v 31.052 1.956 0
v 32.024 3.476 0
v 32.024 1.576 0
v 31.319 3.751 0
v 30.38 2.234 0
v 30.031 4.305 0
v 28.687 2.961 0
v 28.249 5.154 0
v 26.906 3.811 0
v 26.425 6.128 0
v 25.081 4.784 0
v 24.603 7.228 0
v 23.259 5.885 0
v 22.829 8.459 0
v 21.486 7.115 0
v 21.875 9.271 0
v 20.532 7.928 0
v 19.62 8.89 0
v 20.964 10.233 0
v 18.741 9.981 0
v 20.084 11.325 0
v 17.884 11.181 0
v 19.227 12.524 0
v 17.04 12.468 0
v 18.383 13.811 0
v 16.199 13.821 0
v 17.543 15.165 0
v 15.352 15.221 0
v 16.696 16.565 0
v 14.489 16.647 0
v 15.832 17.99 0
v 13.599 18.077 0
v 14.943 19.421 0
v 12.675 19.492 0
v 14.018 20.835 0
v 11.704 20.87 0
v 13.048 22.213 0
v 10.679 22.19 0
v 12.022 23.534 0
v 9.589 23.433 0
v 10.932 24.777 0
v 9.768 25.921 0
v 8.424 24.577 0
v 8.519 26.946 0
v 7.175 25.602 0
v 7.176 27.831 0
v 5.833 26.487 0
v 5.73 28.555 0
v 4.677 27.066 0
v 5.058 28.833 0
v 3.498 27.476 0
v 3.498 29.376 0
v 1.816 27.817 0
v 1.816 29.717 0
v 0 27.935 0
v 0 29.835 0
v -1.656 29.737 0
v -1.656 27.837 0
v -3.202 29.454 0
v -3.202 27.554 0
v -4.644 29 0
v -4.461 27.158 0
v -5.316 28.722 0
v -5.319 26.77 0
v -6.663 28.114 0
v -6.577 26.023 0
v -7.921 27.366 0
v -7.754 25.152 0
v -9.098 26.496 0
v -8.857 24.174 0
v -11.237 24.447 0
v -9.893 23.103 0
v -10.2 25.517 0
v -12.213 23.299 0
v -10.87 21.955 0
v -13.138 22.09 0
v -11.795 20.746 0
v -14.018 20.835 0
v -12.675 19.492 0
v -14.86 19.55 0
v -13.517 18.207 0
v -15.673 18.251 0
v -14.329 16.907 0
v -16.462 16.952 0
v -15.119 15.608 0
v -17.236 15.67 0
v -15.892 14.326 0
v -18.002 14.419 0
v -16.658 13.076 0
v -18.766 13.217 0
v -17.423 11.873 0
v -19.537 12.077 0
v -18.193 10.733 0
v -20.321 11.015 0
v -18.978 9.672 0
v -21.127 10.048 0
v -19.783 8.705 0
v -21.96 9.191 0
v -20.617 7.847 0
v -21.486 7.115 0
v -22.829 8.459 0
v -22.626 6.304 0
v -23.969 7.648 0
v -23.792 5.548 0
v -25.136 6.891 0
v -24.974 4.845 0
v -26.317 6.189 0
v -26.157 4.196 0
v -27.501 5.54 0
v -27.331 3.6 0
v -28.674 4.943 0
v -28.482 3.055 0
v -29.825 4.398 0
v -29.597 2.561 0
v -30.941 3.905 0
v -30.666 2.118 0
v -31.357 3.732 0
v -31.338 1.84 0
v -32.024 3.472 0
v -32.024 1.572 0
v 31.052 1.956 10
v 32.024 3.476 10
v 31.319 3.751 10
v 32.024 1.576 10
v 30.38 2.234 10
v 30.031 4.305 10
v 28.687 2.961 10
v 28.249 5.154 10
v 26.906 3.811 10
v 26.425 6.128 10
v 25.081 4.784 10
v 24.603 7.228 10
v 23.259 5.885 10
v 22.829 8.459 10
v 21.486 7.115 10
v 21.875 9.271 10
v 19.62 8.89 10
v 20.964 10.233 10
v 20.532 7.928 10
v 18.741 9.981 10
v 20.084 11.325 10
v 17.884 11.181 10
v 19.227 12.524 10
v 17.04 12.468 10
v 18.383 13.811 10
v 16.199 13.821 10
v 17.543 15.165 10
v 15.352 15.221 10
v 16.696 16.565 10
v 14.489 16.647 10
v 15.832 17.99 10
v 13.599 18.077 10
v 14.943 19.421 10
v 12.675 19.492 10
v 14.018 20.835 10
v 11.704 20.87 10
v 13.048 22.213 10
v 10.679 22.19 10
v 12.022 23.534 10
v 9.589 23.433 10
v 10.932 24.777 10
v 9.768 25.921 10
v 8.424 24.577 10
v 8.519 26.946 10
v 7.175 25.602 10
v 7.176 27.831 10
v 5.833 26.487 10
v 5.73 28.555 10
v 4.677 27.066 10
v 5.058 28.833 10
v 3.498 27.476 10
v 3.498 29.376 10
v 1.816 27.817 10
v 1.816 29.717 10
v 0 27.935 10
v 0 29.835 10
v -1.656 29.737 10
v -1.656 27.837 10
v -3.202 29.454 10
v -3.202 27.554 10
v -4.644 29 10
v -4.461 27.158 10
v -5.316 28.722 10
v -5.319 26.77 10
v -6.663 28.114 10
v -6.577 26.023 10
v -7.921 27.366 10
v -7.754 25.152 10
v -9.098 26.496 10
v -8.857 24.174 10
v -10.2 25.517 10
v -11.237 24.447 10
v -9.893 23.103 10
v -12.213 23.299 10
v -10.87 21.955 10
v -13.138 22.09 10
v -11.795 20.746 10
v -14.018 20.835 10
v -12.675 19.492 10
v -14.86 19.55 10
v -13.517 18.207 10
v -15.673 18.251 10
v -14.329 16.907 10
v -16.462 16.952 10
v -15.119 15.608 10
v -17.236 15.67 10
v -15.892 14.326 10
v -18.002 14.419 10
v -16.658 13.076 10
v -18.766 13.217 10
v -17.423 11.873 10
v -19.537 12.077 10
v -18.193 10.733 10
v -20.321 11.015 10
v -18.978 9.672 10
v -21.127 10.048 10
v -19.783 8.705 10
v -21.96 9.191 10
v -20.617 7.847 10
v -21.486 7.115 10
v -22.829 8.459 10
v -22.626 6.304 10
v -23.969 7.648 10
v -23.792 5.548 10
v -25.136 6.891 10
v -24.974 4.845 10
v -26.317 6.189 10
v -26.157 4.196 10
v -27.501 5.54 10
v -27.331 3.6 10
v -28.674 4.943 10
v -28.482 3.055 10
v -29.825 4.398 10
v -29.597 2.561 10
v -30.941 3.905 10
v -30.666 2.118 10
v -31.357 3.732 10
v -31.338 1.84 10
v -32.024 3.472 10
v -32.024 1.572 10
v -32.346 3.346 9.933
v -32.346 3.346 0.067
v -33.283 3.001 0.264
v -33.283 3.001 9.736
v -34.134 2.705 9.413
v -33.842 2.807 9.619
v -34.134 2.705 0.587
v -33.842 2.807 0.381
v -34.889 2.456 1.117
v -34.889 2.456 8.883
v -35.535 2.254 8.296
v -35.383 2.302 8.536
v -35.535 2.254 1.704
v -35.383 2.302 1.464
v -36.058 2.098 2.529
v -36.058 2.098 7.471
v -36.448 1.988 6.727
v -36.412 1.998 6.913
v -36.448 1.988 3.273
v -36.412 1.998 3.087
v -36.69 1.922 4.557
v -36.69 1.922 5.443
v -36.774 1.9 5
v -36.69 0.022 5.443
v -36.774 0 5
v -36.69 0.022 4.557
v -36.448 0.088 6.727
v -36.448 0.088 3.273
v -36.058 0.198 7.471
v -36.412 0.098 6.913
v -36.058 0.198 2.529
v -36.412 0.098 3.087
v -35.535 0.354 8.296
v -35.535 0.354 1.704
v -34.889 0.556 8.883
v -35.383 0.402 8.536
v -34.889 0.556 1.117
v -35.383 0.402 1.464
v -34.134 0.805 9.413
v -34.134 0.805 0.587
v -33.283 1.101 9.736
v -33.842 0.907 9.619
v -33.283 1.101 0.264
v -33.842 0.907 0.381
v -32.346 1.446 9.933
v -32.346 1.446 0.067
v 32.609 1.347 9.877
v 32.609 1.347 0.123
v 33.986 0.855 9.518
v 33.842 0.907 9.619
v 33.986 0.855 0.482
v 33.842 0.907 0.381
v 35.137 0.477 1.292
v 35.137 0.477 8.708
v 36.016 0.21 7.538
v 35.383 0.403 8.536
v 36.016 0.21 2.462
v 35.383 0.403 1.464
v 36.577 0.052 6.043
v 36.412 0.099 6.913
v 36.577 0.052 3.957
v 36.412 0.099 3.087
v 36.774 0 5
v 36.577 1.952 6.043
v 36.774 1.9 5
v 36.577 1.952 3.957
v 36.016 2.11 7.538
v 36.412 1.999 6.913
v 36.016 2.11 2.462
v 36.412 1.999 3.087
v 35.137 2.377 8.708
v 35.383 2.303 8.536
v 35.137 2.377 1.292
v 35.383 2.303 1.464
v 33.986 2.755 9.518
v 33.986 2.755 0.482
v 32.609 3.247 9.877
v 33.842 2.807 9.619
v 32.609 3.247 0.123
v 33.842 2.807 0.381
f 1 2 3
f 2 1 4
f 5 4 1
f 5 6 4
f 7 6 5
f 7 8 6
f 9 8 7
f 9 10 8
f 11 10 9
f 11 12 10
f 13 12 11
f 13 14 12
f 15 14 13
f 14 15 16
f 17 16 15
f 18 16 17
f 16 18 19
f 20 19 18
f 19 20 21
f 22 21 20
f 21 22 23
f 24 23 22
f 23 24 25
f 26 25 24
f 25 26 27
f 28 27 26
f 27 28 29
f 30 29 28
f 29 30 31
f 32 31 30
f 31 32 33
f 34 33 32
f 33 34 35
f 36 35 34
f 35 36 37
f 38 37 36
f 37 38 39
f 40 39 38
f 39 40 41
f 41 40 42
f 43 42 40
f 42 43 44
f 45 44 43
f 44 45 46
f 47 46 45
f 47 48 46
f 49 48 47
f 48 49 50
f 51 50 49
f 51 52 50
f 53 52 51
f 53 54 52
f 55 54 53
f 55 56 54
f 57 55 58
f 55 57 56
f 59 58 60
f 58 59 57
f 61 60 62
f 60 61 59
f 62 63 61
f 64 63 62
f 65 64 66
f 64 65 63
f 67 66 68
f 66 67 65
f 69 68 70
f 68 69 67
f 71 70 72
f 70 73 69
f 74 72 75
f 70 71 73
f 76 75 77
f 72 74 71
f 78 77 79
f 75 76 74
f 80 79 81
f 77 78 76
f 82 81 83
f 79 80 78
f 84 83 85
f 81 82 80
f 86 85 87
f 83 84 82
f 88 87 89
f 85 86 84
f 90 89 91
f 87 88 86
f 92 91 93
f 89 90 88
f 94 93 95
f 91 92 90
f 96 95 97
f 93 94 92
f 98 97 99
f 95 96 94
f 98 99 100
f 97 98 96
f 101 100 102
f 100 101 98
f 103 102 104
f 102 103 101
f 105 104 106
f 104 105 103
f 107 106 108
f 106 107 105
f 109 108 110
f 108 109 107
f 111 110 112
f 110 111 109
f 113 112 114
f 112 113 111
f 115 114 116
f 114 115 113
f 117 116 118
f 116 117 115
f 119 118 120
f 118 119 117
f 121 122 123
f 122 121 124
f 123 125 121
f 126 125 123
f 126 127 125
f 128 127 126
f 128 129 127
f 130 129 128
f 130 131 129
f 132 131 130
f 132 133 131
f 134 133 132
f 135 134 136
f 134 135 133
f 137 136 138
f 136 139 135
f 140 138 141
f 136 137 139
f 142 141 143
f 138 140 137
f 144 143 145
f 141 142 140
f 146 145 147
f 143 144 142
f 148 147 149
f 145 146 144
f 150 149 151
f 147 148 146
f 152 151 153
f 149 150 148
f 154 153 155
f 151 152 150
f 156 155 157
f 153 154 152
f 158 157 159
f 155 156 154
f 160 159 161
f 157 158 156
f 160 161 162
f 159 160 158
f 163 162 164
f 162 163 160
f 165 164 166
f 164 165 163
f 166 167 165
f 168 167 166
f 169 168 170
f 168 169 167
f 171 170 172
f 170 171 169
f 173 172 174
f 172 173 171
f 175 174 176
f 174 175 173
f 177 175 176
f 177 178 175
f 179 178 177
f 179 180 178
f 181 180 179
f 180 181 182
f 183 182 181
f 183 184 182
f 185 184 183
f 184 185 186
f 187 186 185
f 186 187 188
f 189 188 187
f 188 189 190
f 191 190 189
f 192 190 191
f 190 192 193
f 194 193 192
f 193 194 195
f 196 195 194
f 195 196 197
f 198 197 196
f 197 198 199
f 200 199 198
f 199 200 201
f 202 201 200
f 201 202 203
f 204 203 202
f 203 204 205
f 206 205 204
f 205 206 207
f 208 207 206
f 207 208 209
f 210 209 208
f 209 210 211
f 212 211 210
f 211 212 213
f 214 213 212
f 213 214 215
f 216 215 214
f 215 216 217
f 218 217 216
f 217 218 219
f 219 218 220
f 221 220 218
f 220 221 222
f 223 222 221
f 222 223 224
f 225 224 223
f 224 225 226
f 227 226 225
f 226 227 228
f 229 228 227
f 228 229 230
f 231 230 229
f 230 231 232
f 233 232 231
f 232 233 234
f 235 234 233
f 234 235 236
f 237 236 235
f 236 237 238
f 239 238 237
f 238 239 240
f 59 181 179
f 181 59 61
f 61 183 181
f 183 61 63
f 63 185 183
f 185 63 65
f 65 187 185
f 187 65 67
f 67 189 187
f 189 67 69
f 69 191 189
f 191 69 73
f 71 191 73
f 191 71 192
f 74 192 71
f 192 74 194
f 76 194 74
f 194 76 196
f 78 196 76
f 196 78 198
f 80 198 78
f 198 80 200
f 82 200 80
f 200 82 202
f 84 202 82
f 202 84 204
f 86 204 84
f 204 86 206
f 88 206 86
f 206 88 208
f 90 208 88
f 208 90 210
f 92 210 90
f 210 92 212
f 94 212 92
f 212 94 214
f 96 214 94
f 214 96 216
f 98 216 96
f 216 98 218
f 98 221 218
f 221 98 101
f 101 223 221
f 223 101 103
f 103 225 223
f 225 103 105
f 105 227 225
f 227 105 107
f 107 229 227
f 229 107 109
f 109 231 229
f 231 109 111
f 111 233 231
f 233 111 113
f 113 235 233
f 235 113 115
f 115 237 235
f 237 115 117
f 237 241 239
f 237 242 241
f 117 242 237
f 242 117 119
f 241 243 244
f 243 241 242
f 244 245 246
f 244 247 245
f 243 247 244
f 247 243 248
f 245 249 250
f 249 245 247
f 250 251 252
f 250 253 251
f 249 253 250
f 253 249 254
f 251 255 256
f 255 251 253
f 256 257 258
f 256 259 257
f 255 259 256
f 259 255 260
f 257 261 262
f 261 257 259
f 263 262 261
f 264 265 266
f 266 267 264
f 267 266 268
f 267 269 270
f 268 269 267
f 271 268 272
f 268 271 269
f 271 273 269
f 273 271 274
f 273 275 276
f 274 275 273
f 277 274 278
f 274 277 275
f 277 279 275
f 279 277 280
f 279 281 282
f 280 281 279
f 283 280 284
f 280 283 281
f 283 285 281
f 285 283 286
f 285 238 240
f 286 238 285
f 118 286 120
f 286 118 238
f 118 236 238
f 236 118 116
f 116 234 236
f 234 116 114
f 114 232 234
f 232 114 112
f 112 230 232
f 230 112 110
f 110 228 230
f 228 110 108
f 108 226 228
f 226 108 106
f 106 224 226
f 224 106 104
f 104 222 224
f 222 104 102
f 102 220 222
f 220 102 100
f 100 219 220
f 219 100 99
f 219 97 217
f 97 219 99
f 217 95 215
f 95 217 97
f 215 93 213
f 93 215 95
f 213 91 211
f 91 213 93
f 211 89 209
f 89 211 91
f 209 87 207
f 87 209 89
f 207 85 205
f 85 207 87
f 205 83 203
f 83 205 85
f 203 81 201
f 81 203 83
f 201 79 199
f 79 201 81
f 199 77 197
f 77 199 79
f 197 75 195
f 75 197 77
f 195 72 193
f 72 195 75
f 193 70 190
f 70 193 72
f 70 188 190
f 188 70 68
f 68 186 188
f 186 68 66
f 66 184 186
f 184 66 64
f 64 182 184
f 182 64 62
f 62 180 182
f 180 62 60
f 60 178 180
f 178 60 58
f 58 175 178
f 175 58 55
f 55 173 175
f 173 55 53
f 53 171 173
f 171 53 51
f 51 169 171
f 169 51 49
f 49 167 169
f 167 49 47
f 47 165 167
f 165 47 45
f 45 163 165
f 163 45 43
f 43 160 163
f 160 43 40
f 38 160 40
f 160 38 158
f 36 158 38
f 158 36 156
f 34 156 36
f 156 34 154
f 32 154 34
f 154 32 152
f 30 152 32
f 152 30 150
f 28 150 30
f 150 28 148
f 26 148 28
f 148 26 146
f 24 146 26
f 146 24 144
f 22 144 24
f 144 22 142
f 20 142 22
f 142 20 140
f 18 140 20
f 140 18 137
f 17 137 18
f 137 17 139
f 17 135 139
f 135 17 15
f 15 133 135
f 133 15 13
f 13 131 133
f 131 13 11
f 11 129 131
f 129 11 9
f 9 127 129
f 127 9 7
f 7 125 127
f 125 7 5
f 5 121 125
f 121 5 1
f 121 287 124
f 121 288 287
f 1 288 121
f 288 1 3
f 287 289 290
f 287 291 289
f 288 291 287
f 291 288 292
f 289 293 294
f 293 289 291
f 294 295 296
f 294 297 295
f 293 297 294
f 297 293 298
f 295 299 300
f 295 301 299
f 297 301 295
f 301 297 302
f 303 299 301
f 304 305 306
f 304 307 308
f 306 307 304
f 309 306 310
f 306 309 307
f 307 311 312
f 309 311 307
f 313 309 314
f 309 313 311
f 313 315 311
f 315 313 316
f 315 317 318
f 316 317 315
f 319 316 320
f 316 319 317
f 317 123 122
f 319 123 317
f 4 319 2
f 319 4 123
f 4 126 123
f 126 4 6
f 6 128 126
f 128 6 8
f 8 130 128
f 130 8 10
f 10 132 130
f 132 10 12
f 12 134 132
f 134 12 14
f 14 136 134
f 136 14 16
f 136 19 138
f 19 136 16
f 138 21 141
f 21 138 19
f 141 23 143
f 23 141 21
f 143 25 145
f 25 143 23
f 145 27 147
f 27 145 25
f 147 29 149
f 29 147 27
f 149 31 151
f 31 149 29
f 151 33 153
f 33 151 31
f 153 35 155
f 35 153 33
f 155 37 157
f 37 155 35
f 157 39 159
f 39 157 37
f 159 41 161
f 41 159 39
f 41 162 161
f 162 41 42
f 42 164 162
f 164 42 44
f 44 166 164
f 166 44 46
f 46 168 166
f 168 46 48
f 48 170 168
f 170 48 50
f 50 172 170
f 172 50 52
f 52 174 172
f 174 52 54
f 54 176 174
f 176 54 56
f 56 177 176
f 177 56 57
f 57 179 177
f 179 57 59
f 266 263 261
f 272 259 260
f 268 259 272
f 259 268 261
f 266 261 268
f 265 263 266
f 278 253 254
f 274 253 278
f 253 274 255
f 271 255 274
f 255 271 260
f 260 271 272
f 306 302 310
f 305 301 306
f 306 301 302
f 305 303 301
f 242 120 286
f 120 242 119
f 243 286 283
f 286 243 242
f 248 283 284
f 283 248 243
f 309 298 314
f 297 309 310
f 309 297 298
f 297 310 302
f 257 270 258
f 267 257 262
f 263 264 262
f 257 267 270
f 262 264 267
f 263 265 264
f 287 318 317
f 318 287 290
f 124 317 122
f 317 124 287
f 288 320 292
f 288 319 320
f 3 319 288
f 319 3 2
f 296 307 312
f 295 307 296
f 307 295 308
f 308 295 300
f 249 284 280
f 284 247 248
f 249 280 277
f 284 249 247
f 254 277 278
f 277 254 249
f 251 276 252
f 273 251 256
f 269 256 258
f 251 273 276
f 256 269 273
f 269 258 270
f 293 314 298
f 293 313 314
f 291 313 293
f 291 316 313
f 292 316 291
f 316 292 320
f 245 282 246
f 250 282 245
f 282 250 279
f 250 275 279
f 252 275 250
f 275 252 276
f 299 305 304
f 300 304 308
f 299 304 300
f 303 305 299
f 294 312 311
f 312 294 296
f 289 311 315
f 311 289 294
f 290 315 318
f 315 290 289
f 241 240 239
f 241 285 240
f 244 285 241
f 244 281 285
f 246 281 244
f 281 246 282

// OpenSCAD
// This file was processed by resolve-include.py [https://github.com/arpruss/miscellaneous-scad/blob/master/scripts/resolve-include.py] 
// to include  all the dependencies inside one file.

thickness = 2;
height = 10;

bezier_precision = -0.1;
xSquish = 0.95;
ySquish = 0.95;

module end_of_parameters_dummy() {}


//BEGIN DEPENDENCY: use <bezier.scad>; // download from https://www.thingiverse.com/thing:2207518
/*
Copyright (c) 2017 Alexander R. Pruss.

Licensed under any Creative Commons Attribution license you like or under the
following MIT License.

Permission is hereby granted, free of charge, to any person obtaining a copy
of this software and associated documentation files (the "Software"), to deal
in the Software without restriction, including without limitation the rights
to use, copy, modify, merge, publish, distribute, sublicense, and/or sell
copies of the Software, and to permit persons to whom the Software is
furnished to do so, subject to the following conditions:

The above copyright notice and this permission notice shall be included in all
copies or substantial portions of the Software.

THE SOFTWARE IS PROVIDED "AS IS", WITHOUT WARRANTY OF ANY KIND, EXPRESS OR
IMPLIED, INCLUDING BUT NOT LIMITED TO THE WARRANTIES OF MERCHANTABILITY,
FITNESS FOR A PARTICULAR PURPOSE AND NONINFRINGEMENT. IN NO EVENT SHALL THE
AUTHORS OR COPYRIGHT HOLDERS BE LIABLE FOR ANY CLAIM, DAMAGES OR OTHER
LIABILITY, WHETHER IN AN ACTION OF CONTRACT, TORT OR OTHERWISE, ARISING FROM,
OUT OF OR IN CONNECTION WITH THE SOFTWARE OR THE USE OR OTHER DEALINGS IN THE
SOFTWARE.

*/


// Public domain Bezier stuff from www.thingiverse.com/thing:8443
function BEZ03(u) = pow(1-u, 3);
function BEZ13(u) = 3*u*pow(1-u,2);
function BEZ23(u) = 3*pow(u,2)*(1-u);
function BEZ33(u) = pow(u,3);
function PointAlongBez4(p0, p1, p2, p3, u) =
	BEZ03(u)*p0+BEZ13(u)*p1+BEZ23(u)*p2+BEZ33(u)*p3;
// End public domain Bezier stuff
function d2BEZ03(u) = 6*(1-u);
function d2BEZ13(u) = 18*u-12;
function d2BEZ23(u) = -18*u+6;
function d2BEZ33(u) = 6*u;

function worstCase2ndDerivative(p0, p1, p2, p3, u1, u2)
    = norm([
        for(i=[0:len(p0)-1])
            max([for(u=[u1,u2])
                d2BEZ03(u)*p0[i]+d2BEZ13(u)*p1[i]+
                d2BEZ23(u)*p2[i]+d2BEZ33(u)*p3[i]]) ]);

function neededIntervalLength(p0,p1,p2,p3,u1,u2,tolerance)
    = let(d2=worstCase2ndDerivative(p0,p1,p2,p3,u1,u2))
        d2==0 ? u2-u1+1 : sqrt(2*tolerance/d2);

function REPEAT_MIRRORED(v,angleStart=0,angleEnd=360) = ["m",v,angleStart,angleEnd];
function SMOOTH_REL(x) = ["r",x];
function SMOOTH_ABS(x) = ["a",x];
function SYMMETRIC() = ["r",1];
function OFFSET(v) = ["o",v];
function SHARP() = OFFSET([0,0,0]);
function LINE() = ["l",0];
function POLAR(r,angle) = OFFSET(r*[cos(angle),sin(angle)]);
//function POINT_IS_SPECIAL(v) = (v[0]=="r" || v[0]=="a" || v[0]=="o" || v[0]=="l");

// this does NOT handle offset type points; to handle those, use DecodeBezierOffsets()
function getControlPoint(cp,node,otherCP,otherNode,nextNode) =
    let(v=node-otherCP) (
    cp[0]=="r" ? node+cp[1]*v:
    cp[0]=="a" ? (
        norm(v)<1e-9 ? node+cp[1]*(node-otherNode)/norm(node-otherNode) : node+cp[1]*v/norm(v) ) :
        cp );

function onLine2(a,b,c,eps=1e-4) =
    norm(c-a) <= eps ? true
        : norm(b-a) <= eps ? false /* to be safe */
            : abs((c[1]-a[1])*(b[0]-a[0]) - (b[1]-a[1])*(c[0]-a[0])) <= eps * eps && norm(c-a) <= eps + norm(b-a);

function isStraight2(p1,c1,c2,p2,eps=1e-4) =
    len(p1) == 2 &&
    onLine2(p1,p2,c1,eps=eps) && onLine2(p2,p1,c2,eps=eps);

function Bezier2(p,index=0,precision=0.05,rightEndPoint=true,optimize=true) = let(nPoints=
        max(1, precision < 0 ?
                    ceil(1/
                        neededIntervalLength(p[index],p[index+1],p[index+2],p[index+3],0,1,-precision))
                    : ceil(1/precision)) )
    optimize && isStraight2(p[index],p[index+1],p[index+2],p[index+3]) ? (rightEndPoint?[p[index+0],p[index+3]]:[p[index+0]] ) :
    [for (i=[0:nPoints-(rightEndPoint?0:1)]) PointAlongBez4(p[index+0],p[index+1],p[index+2],p[index+3],i/nPoints)];

function flatten(listOfLists) = [ for(list = listOfLists) for(item = list) item ];


// p is a list of points, in the format:
// [node1,control1,control2,node2,control3, control4,node3, ...]
// You can replace inner control points with:
//   SYMMETRIC: uses a reflection of the control point on the other side of the node
//   SMOOTH_REL(x): like SYMMETRIC, but the distance of the control point to the node is x times the distance of the other control point to the node
//   SMOOTH_ABS(x): like SYMMETRIC, but the distance of the control point to the node is exactly x
// You can also replace any control point with:
//   OFFSET(v): puts the control point at the corresponding node plus the vector v
//   SHARP(): equivalent to OFFSET([0,0])
//   LINE(): when used for both control points between two nodes, generates a straight line
//   POLAR(r,angle): like OFFSET, except the offset is specified in polar coordinates

function DecodeBezierOffset(control,node) = control[0] == "o" ? node+control[1] : control;

function _mirrorMatrix(normalVector) = let(v = normalVector/norm(normalVector)) len(v)<3 ? [[1-2*v[0]*v[0],-2*v[0]*v[1]],[-2*v[0]*v[1],1-2*v[1]*v[1]]] : [[1-2*v[0]*v[0],-2*v[0]*v[1],-2*v[0]*v[2]],[-2*v[0]*v[1],1-2*v[1]*v[1],-2*v[1]*v[2]],[-2*v[0]*v[2],-2*v[1]*v[2],1-2*v[2]*v[2]]];

function _correctLength(p,start=0) =
    start >= len(p) || p[start][0] == "m" ? 3*floor(start/3)+1 : _correctLength(p,start=start+1);

function _trimArray(a, n) = [for (i=[0:n-1]) a[i]];

function _transformPoint(matrix,a) =
    let(n=len(a))
        len(matrix[0])==n+1 ?
            _trimArray(matrix * concat(a,[1]), n)
            : matrix * a;

function _transformPath(matrix,path) =
    [for (a=path) _transformPoint(matrix,a)];

function _reverseArray(array) = let(n=len(array)) [for (i=[0:n-1]) array[n-1-i]];

function _stitchPaths(a,b) = let(na=len(a)) [for (i=[0:na+len(b)-2]) i<na? a[i] : b[i-na+1]-b[0]+a[na-1]];

// replace all OFFSET/SHARP/POLAR points with coordinates
function DecodeBezierOffsets(p) = [for (i=[0:_correctLength(p)-1]) i%3==0?p[i]:(i%3==1?DecodeBezierOffset(p[i],p[i-1]):DecodeBezierOffset(p[i],p[i+1]))];

function _mirrorPaths(basePath, control, start) =
    control[start][0] == "m" ? _mirrorPaths(_stitchPaths(basePath,_reverseArray(_transformPath(_mirrorMatrix( control[start][1] ),basePath))), control, start+1) : basePath;

function DecodeMirrored(path,start=0) =
    start >= len(path) ? path :
    path[start][0] == "m" ? _mirrorPaths([for(i=[0:1:start-1]) path[i]], path, start) :
        DecodeMirrored(path,start=start+1);

function DecodeLines(p) = [for (i=[0:len(p)-1])
    i%3==0 || p[i][0] != "l" ? p[i] :
    i%3 == 1 ? (p[i-1]*2+p[i+2])/3 :
    (p[i-2]+p[i+1]*2)/3 ];

function DecodeSpecialBezierPoints(p0) =
    let(
        l = _correctLength(p0),
        doMirror = len(p0)>l && p0[l][0] == "m",
        p1=DecodeLines(p0),
        p=DecodeBezierOffsets(p1),
        basePath = [for (i=[0:l-1]) i%3==0?p[i]:(i%3==1?getControlPoint(p[i],p[i-1],p[i-2],p[i-4],p[i+2]):getControlPoint(p[i],p[i+1],p[i+2],p[i+4],p[i-2]))])
        doMirror ? _mirrorPaths(basePath, p0, l) : basePath;

function Distance2D(a,b) = sqrt((a[0]-b[0])*(a[0]-b[0])+(a[1]-b[1])*(a[1]-b[1]));

function RemoveDuplicates(p,eps=0.00001) = let(safeEps = eps/len(p)) [for (i=[0:len(p)-1]) if(i==0 || i==len(p)-1 || Distance2D(p[i-1],p[i]) >= safeEps) p[i]];

function Bezier(p,precision=0.05,eps=0.00001,optimize=true) = let(q=DecodeSpecialBezierPoints(p), nodes=(len(q)-1)/3) RemoveDuplicates(flatten([for (i=[0:nodes-1]) Bezier2(q,optimize=optimize,index=i*3,precision=precision,rightEndPoint=(i==nodes-1))]),eps=eps);

function GetSplineAngle(a,b,c) =
    a==c && b==a ? 0 :
    a==c ? let(ba=b-a) atan2(ba[1],ba[0]) :
    let(ca=c-a) atan2(ca[1],ca[0]);

/*    let(ba=norm(b-a),cb=norm(c-b))
        ba == 0 && cb == 0 ? 0 :
    let(v = ba == 0 ? c-b :
            cb == 0 ? b-a :
            (c-b)*norm(b-a)/norm(c-b)+(b-a))
    atan2(v[1],v[0]); */

// do a spline around b
function SplineAroundPoint(a,b,c,tension=0.5,includeLeftCP=true,includeRightCP=true) =
    includeLeftCP && includeRightCP ?
        [POLAR(tension*norm(a-b),GetSplineAngle(c,b,a)),b,POLAR(tension*norm(c-b),GetSplineAngle(a,b,c))] :
    includeLeftCP ?
        [POLAR(tension*norm(a-b),GetSplineAngle(c,b,a)),b] :
    includeRightCP ?
        [b,POLAR(tension*norm(c-b),GetSplineAngle(a,b,c))] :
        [b];

function mod(n,m) = let(q=n%m) q>=0 ? q : m+q;

function _unit(v) = norm(v)==0 ? [for(x=v) 0] : v/norm(v);

function _corner(p0,p1,p2,offset=2,tension=0.448084975506) =
    [p1-_unit(p1-p0)*offset,
    p1-_unit(p1-p0)*offset*(1-tension),
    p1-_unit(p1-p2)*offset*(1-tension),
    p1-_unit(p1-p2)*offset,
    LINE(),LINE()];

function _roundPathRaw(path,start,end,offset=2,tension=0.551915024494) =
    let(n=len(path),
        p2=_mirrorPaths(path))
        [for(p=[for(i=[start:1:end-1]) _corner(p2[mod(i-1,n)],p2[i],path[mod(i+1,n)],offset=offset,tension=tension)]) for(q=p) q];

function PathToBezier(path,offset=2,tension=0.551915024494,closed=false) =
    let(p1=DecodeMirrored(path),
        n=len(p1))
        offset==0 && tension==0 ?
        p1 :
        !closed ? concat([p1[0],LINE(),LINE()], _roundPathRaw(p1,1,n-1,offset=offset,tension=tension), [p1[n-1]]) :
        let(p2 = _roundPathRaw(p1,0,n,offset=offset,tension=tension),
            n2 = len(p2))
        [for(i=[0:1:n2-3]) p2[mod(i,n2)]];
function BezierSmoothPoints(points,tension=0.5,closed=false)
    = let (n=len(points))
        flatten(
        closed ? [ for (i=[0:n]) SplineAroundPoint(points[(n+i-1)%n],points[i%n],points[(i+1)%n],tension=tension,includeLeftCP=i>0,includeRightCP=i<n) ] :
        [ for (i=[0:n-1])
            SplineAroundPoint(
            i==0 ? 2*points[0]-points[1] : points[(n+i-1)%n],
            points[i],
            i==n-1 ? 2*points[n-1]-points[n-2] : points[(i+1)%n],tension=tension,includeLeftCP=i>0,includeRightCP=i<n-1  ) ]);

module BezierVisualize(p,precision=0.05,eps=0.00001,lineThickness=0.25,controlLineThickness=0.125,nodeSize=1) {
    $fn = 16;
    dim = len(p[0]);
    module point(size) {
        if (dim==2)
            circle(d=size);
        else
            sphere(d=size);
    }
    p1 = DecodeSpecialBezierPoints(p);
    l = Bezier(p1,precision=precision,eps=eps);
    for (i=[0:len(l)-2]) {
        hull() {
            translate(l[i]) point(lineThickness);
            translate(l[i+1]) point(lineThickness);
        }
    }
    for (i=[0:len(p1)-1]) {
        if (i%3 == 0) {
            color("black") translate(p1[i]) point(nodeSize);
        }
        else {
            node = i%3 == 1 ? i-1 : i+1;
            color("red") translate(p1[i]) point(nodeSize);
            color("red") hull() {
                translate(p1[node]) point(controlLineThickness);
                translate(p1[i]) point(controlLineThickness);
            }
        }
    }
}


//END DEPENDENCY: use <bezier.scad>; // download from https://www.thingiverse.com/thing:2207518


//BEGIN DEPENDENCY: use <ribbon.scad>;
module ribbon(points, thickness=1, closed=false) {
    p = closed ? concat(points, [points[0]]) : points;

    union() {
        for (i=[1:len(p)-1]) {
            hull() {
                translate(p[i-1])
                    if ($children==0)
                        circle(d=thickness, $fn=8);
                    else
                        children();
                translate(p[i])
                    if ($children==0)
                        circle(d=thickness, $fn=8);
                    else
                        children();
            }
        }
    }
}

pi = 3.1415926535897932;
function SIN(theta) = sin(theta * 180 / pi);
function COS(theta) = cos(theta * 180 / pi);
function TAN(theta) = tan(theta * 180 / pi);



//END DEPENDENCY: use <ribbon.scad>;



position_svg_1 = [6.992222,264.529947];
size_svg_1 = [38.70946,29.405492];
stroke_width_svg_1 = 0.1;
color_svg_1 = [0,0,0];
fillcolor_svg_1 = undef;
// paths for svg_1
bezier_svg_1_1 = [/*N*/[19.35473,-14.702746],/*CP*/POLAR(0,0),/*CP*/POLAR(8.355186261,-36.77015373),/*N*/[3.969087,-7.506136],/*CP*/POLAR(8.569311825,143.229845719),/*CP*/POLAR(13.22916707,0),/*N*/[-19.35473,14.702746],REPEAT_MIRRORED([1,0])];
points_svg_1_1 = Bezier(bezier_svg_1_1,precision=bezier_precision);

module rounder() {
    translate([0,0,height/2])
    rotate([-90,0,0])
    linear_extrude(height=size_svg_1[1]+thickness*2)
    hull() {
        translate([-size_svg_1[0]+height/2,0]) circle(d=height,$fn=16);
        translate([size_svg_1[0]-height/2,0]) circle(d=height,$fn=16);
    }
}

scale([xSquish,ySquish,1])
intersection() {
translate([size_svg_1[0]/2,size_svg_1[1]/2+thickness/2,0]) linear_extrude(height=height) ribbon(points_svg_1_1,thickness=thickness);
    rounder();
}
